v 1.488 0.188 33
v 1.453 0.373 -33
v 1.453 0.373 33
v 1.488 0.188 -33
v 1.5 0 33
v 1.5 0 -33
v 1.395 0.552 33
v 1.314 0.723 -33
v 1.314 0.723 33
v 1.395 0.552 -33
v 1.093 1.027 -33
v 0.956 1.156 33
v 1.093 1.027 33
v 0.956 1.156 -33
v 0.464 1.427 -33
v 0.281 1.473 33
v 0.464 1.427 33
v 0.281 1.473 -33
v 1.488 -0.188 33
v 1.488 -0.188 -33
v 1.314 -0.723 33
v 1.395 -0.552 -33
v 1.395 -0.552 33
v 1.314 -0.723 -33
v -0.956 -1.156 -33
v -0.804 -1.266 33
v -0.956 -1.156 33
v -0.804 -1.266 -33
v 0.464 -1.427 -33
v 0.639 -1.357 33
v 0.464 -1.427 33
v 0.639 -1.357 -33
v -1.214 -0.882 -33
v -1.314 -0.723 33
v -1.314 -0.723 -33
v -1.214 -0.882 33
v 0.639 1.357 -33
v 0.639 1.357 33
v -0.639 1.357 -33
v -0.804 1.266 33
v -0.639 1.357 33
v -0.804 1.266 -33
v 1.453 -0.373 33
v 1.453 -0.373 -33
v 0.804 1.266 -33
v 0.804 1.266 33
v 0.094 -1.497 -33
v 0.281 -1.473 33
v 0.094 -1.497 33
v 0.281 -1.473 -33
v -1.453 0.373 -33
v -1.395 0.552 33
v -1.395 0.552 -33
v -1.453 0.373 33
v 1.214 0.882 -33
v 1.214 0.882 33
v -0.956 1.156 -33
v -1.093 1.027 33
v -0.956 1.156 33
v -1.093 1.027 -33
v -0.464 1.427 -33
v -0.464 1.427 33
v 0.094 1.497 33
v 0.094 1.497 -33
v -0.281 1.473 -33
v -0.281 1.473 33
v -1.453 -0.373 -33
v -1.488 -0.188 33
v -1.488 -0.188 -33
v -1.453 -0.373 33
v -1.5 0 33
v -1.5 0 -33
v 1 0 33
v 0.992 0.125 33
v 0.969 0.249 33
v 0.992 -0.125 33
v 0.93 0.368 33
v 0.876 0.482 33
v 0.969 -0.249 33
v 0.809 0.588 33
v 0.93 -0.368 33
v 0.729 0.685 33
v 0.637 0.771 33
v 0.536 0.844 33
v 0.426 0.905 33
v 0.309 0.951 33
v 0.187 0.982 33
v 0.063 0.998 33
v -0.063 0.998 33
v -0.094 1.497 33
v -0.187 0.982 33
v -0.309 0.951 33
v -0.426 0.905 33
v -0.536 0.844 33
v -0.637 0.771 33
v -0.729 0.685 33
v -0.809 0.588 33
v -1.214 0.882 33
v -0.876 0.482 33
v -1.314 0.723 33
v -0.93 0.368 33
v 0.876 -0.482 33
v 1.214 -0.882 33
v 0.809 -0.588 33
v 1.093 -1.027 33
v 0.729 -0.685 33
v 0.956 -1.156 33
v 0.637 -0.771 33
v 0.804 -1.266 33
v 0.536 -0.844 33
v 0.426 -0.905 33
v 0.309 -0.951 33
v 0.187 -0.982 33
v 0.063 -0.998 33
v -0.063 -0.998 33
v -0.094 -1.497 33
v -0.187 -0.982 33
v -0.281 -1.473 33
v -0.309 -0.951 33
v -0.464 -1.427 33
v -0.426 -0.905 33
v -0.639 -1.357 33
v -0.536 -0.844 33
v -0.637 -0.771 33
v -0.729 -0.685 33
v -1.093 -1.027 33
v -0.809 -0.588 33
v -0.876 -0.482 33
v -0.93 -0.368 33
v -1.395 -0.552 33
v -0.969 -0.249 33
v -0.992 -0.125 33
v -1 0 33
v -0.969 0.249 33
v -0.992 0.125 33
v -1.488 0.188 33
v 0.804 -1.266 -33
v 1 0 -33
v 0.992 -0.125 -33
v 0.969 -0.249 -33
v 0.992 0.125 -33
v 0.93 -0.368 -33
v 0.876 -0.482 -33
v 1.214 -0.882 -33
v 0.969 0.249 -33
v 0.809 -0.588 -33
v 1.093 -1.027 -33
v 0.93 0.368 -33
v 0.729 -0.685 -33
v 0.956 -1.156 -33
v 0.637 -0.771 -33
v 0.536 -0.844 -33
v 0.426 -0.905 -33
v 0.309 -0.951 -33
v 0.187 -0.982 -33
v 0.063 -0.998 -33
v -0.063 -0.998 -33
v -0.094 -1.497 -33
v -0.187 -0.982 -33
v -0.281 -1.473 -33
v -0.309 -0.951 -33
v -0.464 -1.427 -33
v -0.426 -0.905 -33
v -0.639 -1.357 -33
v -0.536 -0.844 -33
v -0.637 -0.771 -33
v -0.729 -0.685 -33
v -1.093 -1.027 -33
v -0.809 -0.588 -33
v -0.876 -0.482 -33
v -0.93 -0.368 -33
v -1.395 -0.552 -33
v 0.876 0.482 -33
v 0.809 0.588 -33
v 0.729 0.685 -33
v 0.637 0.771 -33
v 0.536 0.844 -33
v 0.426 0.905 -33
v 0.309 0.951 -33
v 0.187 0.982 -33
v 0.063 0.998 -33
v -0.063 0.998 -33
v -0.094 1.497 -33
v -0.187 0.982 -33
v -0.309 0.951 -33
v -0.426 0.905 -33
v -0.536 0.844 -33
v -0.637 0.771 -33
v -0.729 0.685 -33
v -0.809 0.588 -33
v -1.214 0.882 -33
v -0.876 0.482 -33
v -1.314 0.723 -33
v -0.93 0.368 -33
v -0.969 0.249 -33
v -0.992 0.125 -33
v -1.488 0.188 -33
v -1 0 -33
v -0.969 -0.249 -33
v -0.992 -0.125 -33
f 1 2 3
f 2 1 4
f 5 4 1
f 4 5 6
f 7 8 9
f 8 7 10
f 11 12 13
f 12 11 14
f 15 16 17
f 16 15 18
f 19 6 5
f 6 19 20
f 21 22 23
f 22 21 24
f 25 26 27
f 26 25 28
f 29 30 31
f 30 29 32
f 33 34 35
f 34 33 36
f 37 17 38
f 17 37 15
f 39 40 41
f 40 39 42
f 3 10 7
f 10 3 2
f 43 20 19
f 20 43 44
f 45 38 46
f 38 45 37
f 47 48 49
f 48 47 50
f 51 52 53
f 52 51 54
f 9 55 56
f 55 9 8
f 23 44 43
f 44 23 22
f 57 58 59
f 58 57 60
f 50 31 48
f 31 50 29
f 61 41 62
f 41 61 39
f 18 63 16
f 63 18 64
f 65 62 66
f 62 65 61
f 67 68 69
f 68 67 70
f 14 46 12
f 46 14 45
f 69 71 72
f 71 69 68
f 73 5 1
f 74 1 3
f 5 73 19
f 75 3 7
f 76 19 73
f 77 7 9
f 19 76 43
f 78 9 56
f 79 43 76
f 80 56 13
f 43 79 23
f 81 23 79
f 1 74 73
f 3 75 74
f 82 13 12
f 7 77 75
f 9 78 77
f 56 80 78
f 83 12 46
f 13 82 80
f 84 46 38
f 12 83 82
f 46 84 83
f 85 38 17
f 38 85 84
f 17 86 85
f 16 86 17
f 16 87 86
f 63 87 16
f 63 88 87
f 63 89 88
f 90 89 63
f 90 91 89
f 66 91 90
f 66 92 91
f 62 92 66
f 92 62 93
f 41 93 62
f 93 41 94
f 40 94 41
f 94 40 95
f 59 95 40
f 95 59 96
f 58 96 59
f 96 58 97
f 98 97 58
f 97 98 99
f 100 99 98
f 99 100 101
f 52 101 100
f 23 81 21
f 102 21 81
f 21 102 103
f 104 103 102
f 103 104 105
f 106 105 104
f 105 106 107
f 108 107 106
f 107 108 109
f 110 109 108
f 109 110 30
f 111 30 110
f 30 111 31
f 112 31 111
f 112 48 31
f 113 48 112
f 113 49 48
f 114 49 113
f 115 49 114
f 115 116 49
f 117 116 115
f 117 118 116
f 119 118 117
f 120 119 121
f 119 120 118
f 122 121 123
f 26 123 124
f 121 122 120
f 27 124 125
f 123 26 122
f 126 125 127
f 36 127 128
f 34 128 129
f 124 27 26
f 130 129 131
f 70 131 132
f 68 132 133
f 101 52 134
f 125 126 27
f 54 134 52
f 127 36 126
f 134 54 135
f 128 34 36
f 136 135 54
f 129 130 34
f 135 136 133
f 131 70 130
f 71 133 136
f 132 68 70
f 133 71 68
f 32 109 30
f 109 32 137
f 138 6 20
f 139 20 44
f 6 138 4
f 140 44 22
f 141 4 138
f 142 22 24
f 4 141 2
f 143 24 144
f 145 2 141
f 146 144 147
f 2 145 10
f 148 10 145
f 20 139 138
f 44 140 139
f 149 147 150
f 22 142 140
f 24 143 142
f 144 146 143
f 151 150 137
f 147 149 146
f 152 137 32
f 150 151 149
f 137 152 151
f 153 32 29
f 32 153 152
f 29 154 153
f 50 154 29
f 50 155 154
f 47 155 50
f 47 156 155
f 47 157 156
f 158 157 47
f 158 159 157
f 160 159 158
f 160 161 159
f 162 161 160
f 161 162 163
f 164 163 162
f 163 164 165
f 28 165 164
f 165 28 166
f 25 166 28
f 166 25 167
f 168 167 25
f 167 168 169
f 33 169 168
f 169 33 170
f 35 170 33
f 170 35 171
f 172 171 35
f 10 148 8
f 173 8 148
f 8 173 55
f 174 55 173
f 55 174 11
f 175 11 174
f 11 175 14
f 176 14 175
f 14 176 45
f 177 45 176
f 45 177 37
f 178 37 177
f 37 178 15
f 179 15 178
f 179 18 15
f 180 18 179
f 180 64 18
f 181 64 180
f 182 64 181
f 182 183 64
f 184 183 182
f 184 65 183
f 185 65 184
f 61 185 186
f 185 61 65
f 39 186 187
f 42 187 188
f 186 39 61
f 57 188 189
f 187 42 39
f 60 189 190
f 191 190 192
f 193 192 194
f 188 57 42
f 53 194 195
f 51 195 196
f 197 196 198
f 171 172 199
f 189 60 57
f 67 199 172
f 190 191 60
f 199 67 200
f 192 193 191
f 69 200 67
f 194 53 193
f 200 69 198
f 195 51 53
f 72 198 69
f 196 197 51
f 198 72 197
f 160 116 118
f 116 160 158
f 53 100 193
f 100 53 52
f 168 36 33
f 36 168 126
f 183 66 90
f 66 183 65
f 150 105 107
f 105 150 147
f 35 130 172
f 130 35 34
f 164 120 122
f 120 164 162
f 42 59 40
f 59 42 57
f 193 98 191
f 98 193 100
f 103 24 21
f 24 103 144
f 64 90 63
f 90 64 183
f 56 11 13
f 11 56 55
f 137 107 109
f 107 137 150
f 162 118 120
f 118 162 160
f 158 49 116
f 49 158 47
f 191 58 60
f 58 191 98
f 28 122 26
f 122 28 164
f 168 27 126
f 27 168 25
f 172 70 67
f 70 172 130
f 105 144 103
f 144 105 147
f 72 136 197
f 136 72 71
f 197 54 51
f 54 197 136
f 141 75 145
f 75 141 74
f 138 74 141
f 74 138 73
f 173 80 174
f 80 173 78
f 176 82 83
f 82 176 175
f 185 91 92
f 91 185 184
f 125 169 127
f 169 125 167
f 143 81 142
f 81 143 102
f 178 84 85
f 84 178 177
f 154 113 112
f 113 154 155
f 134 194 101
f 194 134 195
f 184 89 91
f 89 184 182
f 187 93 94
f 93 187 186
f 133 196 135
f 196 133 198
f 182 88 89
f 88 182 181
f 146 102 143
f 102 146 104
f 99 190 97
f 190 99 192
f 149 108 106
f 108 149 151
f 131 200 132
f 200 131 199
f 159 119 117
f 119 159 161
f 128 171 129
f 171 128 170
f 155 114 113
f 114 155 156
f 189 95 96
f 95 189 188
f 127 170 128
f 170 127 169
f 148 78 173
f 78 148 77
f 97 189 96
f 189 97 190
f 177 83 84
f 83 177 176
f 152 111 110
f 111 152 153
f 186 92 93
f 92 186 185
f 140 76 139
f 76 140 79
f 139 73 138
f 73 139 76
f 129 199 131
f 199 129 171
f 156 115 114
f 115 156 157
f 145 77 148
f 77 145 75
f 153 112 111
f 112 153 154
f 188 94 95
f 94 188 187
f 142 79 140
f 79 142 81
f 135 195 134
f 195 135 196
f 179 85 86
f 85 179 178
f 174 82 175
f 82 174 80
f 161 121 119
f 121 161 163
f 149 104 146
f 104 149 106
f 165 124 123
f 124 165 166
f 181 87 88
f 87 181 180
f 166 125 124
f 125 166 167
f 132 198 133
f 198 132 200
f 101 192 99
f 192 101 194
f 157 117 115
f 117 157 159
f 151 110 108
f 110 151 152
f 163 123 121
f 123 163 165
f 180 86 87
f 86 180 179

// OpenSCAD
$fn = 50;


difference() {
	union() {
		translate(v = [0, 0, -33.0000000000]) {
			cylinder(h = 66, r = 1.5000000000);
		}
	}
	union() {
		translate(v = [0, 0, -100.0000000000]) {
			cylinder(h = 200, r = 1.0000000000);
		}
	}
}
